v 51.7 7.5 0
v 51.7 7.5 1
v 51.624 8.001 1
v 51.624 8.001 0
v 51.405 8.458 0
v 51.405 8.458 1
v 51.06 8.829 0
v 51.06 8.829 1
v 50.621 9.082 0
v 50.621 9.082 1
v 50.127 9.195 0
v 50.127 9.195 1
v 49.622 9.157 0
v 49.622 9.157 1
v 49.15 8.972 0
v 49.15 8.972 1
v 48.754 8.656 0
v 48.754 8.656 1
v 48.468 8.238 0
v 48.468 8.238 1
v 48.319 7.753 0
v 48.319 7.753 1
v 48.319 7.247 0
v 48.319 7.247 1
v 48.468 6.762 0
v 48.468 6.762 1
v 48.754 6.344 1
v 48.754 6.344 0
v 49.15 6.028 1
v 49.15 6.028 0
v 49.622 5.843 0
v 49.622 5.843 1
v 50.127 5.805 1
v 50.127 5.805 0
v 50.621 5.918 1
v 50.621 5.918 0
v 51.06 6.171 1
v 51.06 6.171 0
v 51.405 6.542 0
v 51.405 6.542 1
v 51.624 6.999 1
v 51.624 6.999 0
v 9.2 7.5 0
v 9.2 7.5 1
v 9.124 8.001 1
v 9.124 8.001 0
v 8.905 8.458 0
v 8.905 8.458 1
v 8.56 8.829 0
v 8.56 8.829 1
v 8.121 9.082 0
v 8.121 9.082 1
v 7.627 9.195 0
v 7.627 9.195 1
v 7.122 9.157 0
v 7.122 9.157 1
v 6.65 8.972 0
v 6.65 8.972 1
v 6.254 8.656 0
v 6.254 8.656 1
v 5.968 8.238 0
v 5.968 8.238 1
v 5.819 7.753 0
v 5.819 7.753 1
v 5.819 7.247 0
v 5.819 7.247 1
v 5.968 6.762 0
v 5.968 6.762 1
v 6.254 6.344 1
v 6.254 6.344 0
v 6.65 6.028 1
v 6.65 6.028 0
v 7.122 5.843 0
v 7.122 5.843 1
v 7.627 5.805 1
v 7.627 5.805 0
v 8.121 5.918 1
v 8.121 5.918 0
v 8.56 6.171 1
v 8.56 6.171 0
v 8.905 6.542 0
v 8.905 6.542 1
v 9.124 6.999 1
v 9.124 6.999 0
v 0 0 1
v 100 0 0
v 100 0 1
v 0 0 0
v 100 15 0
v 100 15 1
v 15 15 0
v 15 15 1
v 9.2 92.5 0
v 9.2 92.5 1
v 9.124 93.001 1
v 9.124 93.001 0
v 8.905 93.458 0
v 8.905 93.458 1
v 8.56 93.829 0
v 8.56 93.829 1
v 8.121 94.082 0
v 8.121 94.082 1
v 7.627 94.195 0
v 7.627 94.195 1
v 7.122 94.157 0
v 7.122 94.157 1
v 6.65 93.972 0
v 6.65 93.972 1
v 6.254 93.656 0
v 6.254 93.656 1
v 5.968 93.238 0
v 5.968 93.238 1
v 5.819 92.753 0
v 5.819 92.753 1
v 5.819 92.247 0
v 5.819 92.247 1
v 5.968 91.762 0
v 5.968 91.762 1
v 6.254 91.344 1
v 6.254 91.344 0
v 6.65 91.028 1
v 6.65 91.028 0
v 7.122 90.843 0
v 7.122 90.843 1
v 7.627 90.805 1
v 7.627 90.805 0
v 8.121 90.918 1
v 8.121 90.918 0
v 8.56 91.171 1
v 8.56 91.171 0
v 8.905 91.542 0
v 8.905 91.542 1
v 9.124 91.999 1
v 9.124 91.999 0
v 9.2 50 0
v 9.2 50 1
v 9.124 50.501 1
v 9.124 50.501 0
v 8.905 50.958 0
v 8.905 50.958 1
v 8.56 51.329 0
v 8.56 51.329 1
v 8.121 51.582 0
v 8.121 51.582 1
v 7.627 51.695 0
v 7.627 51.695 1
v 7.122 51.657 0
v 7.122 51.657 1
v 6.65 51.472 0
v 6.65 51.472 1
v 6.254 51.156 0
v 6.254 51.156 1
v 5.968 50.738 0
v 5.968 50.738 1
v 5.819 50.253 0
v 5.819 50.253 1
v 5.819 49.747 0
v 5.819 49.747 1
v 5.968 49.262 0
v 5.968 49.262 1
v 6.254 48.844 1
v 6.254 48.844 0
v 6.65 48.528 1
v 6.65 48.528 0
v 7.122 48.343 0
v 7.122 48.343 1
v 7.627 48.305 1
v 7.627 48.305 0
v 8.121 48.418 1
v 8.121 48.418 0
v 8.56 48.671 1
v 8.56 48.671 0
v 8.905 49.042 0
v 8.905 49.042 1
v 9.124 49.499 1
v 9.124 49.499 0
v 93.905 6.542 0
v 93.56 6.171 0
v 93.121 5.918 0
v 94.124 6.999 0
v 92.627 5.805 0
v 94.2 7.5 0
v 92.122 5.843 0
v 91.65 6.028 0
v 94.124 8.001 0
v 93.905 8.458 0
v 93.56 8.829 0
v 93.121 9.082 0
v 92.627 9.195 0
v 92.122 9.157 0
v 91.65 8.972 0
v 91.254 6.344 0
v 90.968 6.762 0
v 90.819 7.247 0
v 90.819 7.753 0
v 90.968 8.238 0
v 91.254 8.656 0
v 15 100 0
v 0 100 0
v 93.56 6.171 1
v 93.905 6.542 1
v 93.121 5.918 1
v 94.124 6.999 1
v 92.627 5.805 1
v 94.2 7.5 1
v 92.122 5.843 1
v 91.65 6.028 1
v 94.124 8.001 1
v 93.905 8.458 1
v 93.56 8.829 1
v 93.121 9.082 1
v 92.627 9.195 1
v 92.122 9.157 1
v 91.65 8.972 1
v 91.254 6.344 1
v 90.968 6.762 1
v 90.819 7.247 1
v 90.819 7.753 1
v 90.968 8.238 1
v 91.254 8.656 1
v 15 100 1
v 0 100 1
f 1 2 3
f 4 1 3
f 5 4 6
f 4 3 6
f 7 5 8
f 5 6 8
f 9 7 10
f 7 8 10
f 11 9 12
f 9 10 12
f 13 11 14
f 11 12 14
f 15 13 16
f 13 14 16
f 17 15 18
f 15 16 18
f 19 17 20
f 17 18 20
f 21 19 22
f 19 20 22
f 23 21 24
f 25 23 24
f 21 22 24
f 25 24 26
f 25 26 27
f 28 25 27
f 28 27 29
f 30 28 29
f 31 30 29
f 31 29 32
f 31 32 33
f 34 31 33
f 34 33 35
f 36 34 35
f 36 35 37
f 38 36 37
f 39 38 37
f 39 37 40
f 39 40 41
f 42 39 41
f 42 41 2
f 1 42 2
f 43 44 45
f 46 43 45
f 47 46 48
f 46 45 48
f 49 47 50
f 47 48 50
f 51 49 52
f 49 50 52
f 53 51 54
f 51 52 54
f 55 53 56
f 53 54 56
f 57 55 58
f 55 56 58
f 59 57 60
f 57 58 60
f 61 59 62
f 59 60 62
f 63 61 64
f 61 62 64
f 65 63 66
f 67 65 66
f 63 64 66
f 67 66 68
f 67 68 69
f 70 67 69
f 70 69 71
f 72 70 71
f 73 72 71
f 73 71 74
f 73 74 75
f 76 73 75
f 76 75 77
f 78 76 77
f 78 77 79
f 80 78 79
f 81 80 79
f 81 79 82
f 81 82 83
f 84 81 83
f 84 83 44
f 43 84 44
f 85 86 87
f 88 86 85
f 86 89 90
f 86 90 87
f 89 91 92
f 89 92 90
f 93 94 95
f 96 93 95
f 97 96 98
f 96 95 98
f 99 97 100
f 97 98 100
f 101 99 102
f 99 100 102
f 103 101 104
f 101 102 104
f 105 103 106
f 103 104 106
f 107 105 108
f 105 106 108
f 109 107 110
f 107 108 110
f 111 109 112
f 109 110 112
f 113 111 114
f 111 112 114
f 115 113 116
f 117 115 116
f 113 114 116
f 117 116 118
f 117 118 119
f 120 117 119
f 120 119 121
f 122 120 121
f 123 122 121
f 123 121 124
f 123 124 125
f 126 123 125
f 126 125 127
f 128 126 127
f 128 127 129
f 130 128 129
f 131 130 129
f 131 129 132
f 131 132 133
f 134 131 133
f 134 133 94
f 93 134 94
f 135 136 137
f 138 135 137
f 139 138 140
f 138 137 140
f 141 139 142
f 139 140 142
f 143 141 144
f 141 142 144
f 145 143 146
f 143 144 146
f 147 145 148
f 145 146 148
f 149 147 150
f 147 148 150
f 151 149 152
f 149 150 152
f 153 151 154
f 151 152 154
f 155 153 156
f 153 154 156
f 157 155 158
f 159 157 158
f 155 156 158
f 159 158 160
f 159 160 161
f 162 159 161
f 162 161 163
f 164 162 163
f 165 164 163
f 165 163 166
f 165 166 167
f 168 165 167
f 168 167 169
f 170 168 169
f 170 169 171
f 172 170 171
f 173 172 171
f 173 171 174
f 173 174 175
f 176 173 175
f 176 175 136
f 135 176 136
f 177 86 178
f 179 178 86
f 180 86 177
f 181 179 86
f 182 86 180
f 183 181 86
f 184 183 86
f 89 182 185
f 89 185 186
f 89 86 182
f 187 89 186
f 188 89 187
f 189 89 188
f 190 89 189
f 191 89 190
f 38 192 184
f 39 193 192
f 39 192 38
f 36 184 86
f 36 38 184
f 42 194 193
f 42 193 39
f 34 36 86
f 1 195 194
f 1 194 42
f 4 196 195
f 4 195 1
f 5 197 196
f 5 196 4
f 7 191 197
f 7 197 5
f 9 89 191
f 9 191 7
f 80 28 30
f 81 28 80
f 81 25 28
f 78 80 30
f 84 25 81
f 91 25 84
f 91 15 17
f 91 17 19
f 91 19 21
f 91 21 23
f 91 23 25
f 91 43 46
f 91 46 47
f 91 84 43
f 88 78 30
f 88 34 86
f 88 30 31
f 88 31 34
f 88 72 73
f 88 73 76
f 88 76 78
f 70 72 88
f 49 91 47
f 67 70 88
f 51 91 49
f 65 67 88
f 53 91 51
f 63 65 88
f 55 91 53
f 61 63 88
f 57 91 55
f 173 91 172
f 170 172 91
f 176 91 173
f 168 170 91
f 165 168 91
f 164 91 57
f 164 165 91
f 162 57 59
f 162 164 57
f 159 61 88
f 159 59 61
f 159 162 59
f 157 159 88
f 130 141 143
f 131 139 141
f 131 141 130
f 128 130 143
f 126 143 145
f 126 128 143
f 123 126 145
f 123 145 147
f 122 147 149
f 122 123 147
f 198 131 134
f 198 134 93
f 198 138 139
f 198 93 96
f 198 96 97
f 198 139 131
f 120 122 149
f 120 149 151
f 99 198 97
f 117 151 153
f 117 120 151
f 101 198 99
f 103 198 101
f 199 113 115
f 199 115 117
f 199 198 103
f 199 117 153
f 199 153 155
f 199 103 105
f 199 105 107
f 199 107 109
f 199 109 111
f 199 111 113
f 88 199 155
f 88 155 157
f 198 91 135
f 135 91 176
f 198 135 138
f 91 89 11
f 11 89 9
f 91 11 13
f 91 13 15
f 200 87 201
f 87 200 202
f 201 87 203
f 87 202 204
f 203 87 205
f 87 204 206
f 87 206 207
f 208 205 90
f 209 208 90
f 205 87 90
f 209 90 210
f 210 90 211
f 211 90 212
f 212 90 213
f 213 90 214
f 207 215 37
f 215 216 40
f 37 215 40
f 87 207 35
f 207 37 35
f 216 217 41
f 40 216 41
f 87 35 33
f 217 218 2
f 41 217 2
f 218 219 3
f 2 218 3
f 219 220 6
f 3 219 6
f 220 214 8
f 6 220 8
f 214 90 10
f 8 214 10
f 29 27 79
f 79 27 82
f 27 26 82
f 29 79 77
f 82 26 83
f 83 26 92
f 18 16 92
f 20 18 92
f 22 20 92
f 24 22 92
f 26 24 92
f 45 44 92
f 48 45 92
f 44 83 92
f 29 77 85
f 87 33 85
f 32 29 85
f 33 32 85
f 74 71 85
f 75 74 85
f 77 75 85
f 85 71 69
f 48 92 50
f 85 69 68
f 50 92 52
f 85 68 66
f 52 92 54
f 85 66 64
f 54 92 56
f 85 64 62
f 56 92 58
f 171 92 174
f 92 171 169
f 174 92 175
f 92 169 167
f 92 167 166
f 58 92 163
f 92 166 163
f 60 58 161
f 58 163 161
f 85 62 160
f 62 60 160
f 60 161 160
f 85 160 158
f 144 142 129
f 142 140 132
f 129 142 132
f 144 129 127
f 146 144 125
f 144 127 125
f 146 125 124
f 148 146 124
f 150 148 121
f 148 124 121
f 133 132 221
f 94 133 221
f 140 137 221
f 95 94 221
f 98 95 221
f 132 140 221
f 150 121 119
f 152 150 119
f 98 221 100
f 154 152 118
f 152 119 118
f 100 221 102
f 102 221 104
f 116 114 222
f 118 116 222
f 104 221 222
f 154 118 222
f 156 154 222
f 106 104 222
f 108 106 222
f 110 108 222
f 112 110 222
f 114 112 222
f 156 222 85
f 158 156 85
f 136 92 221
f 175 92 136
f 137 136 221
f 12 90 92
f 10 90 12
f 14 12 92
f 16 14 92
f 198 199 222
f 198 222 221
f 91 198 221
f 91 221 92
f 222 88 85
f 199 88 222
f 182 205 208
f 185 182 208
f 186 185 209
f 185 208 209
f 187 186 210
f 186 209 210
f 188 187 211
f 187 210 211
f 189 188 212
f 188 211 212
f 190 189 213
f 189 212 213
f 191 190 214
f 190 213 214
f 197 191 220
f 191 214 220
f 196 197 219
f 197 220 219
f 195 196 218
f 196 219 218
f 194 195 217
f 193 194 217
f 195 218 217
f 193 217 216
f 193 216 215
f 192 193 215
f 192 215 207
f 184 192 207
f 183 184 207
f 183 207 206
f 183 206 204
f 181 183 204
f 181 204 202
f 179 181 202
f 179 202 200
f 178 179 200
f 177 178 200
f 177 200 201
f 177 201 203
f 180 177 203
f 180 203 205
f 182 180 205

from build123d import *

# Parameters (mm, degrees)
BOSS_EXTRUDE1_DEPTH  = 1
M3_CLEARANCE_HOLE1_D = 3.4


with BuildPart() as part:
    # Sketch1 → Boss-Extrude1 (new body)
    with BuildSketch(Plane.XY):
        Polygon((0, 0), (0, 100), (15, 100), (15, 15), (100, 15), (100, 0), align=None)
    extrude(amount=BOSS_EXTRUDE1_DEPTH)

    # M3 Clearance Hole1 (through all)
    with Locations(Plane(origin=(0, 0, 0), x_dir=(-1, 0, 0), z_dir=(0, 0, -1))):
        with Locations((-92.5, 7.5), (-7.5, 7.5), (-7.5, 92.5), (-7.5, 50), (-50, 7.5)):
            Hole(M3_CLEARANCE_HOLE1_D / 2)


solid = part.part
